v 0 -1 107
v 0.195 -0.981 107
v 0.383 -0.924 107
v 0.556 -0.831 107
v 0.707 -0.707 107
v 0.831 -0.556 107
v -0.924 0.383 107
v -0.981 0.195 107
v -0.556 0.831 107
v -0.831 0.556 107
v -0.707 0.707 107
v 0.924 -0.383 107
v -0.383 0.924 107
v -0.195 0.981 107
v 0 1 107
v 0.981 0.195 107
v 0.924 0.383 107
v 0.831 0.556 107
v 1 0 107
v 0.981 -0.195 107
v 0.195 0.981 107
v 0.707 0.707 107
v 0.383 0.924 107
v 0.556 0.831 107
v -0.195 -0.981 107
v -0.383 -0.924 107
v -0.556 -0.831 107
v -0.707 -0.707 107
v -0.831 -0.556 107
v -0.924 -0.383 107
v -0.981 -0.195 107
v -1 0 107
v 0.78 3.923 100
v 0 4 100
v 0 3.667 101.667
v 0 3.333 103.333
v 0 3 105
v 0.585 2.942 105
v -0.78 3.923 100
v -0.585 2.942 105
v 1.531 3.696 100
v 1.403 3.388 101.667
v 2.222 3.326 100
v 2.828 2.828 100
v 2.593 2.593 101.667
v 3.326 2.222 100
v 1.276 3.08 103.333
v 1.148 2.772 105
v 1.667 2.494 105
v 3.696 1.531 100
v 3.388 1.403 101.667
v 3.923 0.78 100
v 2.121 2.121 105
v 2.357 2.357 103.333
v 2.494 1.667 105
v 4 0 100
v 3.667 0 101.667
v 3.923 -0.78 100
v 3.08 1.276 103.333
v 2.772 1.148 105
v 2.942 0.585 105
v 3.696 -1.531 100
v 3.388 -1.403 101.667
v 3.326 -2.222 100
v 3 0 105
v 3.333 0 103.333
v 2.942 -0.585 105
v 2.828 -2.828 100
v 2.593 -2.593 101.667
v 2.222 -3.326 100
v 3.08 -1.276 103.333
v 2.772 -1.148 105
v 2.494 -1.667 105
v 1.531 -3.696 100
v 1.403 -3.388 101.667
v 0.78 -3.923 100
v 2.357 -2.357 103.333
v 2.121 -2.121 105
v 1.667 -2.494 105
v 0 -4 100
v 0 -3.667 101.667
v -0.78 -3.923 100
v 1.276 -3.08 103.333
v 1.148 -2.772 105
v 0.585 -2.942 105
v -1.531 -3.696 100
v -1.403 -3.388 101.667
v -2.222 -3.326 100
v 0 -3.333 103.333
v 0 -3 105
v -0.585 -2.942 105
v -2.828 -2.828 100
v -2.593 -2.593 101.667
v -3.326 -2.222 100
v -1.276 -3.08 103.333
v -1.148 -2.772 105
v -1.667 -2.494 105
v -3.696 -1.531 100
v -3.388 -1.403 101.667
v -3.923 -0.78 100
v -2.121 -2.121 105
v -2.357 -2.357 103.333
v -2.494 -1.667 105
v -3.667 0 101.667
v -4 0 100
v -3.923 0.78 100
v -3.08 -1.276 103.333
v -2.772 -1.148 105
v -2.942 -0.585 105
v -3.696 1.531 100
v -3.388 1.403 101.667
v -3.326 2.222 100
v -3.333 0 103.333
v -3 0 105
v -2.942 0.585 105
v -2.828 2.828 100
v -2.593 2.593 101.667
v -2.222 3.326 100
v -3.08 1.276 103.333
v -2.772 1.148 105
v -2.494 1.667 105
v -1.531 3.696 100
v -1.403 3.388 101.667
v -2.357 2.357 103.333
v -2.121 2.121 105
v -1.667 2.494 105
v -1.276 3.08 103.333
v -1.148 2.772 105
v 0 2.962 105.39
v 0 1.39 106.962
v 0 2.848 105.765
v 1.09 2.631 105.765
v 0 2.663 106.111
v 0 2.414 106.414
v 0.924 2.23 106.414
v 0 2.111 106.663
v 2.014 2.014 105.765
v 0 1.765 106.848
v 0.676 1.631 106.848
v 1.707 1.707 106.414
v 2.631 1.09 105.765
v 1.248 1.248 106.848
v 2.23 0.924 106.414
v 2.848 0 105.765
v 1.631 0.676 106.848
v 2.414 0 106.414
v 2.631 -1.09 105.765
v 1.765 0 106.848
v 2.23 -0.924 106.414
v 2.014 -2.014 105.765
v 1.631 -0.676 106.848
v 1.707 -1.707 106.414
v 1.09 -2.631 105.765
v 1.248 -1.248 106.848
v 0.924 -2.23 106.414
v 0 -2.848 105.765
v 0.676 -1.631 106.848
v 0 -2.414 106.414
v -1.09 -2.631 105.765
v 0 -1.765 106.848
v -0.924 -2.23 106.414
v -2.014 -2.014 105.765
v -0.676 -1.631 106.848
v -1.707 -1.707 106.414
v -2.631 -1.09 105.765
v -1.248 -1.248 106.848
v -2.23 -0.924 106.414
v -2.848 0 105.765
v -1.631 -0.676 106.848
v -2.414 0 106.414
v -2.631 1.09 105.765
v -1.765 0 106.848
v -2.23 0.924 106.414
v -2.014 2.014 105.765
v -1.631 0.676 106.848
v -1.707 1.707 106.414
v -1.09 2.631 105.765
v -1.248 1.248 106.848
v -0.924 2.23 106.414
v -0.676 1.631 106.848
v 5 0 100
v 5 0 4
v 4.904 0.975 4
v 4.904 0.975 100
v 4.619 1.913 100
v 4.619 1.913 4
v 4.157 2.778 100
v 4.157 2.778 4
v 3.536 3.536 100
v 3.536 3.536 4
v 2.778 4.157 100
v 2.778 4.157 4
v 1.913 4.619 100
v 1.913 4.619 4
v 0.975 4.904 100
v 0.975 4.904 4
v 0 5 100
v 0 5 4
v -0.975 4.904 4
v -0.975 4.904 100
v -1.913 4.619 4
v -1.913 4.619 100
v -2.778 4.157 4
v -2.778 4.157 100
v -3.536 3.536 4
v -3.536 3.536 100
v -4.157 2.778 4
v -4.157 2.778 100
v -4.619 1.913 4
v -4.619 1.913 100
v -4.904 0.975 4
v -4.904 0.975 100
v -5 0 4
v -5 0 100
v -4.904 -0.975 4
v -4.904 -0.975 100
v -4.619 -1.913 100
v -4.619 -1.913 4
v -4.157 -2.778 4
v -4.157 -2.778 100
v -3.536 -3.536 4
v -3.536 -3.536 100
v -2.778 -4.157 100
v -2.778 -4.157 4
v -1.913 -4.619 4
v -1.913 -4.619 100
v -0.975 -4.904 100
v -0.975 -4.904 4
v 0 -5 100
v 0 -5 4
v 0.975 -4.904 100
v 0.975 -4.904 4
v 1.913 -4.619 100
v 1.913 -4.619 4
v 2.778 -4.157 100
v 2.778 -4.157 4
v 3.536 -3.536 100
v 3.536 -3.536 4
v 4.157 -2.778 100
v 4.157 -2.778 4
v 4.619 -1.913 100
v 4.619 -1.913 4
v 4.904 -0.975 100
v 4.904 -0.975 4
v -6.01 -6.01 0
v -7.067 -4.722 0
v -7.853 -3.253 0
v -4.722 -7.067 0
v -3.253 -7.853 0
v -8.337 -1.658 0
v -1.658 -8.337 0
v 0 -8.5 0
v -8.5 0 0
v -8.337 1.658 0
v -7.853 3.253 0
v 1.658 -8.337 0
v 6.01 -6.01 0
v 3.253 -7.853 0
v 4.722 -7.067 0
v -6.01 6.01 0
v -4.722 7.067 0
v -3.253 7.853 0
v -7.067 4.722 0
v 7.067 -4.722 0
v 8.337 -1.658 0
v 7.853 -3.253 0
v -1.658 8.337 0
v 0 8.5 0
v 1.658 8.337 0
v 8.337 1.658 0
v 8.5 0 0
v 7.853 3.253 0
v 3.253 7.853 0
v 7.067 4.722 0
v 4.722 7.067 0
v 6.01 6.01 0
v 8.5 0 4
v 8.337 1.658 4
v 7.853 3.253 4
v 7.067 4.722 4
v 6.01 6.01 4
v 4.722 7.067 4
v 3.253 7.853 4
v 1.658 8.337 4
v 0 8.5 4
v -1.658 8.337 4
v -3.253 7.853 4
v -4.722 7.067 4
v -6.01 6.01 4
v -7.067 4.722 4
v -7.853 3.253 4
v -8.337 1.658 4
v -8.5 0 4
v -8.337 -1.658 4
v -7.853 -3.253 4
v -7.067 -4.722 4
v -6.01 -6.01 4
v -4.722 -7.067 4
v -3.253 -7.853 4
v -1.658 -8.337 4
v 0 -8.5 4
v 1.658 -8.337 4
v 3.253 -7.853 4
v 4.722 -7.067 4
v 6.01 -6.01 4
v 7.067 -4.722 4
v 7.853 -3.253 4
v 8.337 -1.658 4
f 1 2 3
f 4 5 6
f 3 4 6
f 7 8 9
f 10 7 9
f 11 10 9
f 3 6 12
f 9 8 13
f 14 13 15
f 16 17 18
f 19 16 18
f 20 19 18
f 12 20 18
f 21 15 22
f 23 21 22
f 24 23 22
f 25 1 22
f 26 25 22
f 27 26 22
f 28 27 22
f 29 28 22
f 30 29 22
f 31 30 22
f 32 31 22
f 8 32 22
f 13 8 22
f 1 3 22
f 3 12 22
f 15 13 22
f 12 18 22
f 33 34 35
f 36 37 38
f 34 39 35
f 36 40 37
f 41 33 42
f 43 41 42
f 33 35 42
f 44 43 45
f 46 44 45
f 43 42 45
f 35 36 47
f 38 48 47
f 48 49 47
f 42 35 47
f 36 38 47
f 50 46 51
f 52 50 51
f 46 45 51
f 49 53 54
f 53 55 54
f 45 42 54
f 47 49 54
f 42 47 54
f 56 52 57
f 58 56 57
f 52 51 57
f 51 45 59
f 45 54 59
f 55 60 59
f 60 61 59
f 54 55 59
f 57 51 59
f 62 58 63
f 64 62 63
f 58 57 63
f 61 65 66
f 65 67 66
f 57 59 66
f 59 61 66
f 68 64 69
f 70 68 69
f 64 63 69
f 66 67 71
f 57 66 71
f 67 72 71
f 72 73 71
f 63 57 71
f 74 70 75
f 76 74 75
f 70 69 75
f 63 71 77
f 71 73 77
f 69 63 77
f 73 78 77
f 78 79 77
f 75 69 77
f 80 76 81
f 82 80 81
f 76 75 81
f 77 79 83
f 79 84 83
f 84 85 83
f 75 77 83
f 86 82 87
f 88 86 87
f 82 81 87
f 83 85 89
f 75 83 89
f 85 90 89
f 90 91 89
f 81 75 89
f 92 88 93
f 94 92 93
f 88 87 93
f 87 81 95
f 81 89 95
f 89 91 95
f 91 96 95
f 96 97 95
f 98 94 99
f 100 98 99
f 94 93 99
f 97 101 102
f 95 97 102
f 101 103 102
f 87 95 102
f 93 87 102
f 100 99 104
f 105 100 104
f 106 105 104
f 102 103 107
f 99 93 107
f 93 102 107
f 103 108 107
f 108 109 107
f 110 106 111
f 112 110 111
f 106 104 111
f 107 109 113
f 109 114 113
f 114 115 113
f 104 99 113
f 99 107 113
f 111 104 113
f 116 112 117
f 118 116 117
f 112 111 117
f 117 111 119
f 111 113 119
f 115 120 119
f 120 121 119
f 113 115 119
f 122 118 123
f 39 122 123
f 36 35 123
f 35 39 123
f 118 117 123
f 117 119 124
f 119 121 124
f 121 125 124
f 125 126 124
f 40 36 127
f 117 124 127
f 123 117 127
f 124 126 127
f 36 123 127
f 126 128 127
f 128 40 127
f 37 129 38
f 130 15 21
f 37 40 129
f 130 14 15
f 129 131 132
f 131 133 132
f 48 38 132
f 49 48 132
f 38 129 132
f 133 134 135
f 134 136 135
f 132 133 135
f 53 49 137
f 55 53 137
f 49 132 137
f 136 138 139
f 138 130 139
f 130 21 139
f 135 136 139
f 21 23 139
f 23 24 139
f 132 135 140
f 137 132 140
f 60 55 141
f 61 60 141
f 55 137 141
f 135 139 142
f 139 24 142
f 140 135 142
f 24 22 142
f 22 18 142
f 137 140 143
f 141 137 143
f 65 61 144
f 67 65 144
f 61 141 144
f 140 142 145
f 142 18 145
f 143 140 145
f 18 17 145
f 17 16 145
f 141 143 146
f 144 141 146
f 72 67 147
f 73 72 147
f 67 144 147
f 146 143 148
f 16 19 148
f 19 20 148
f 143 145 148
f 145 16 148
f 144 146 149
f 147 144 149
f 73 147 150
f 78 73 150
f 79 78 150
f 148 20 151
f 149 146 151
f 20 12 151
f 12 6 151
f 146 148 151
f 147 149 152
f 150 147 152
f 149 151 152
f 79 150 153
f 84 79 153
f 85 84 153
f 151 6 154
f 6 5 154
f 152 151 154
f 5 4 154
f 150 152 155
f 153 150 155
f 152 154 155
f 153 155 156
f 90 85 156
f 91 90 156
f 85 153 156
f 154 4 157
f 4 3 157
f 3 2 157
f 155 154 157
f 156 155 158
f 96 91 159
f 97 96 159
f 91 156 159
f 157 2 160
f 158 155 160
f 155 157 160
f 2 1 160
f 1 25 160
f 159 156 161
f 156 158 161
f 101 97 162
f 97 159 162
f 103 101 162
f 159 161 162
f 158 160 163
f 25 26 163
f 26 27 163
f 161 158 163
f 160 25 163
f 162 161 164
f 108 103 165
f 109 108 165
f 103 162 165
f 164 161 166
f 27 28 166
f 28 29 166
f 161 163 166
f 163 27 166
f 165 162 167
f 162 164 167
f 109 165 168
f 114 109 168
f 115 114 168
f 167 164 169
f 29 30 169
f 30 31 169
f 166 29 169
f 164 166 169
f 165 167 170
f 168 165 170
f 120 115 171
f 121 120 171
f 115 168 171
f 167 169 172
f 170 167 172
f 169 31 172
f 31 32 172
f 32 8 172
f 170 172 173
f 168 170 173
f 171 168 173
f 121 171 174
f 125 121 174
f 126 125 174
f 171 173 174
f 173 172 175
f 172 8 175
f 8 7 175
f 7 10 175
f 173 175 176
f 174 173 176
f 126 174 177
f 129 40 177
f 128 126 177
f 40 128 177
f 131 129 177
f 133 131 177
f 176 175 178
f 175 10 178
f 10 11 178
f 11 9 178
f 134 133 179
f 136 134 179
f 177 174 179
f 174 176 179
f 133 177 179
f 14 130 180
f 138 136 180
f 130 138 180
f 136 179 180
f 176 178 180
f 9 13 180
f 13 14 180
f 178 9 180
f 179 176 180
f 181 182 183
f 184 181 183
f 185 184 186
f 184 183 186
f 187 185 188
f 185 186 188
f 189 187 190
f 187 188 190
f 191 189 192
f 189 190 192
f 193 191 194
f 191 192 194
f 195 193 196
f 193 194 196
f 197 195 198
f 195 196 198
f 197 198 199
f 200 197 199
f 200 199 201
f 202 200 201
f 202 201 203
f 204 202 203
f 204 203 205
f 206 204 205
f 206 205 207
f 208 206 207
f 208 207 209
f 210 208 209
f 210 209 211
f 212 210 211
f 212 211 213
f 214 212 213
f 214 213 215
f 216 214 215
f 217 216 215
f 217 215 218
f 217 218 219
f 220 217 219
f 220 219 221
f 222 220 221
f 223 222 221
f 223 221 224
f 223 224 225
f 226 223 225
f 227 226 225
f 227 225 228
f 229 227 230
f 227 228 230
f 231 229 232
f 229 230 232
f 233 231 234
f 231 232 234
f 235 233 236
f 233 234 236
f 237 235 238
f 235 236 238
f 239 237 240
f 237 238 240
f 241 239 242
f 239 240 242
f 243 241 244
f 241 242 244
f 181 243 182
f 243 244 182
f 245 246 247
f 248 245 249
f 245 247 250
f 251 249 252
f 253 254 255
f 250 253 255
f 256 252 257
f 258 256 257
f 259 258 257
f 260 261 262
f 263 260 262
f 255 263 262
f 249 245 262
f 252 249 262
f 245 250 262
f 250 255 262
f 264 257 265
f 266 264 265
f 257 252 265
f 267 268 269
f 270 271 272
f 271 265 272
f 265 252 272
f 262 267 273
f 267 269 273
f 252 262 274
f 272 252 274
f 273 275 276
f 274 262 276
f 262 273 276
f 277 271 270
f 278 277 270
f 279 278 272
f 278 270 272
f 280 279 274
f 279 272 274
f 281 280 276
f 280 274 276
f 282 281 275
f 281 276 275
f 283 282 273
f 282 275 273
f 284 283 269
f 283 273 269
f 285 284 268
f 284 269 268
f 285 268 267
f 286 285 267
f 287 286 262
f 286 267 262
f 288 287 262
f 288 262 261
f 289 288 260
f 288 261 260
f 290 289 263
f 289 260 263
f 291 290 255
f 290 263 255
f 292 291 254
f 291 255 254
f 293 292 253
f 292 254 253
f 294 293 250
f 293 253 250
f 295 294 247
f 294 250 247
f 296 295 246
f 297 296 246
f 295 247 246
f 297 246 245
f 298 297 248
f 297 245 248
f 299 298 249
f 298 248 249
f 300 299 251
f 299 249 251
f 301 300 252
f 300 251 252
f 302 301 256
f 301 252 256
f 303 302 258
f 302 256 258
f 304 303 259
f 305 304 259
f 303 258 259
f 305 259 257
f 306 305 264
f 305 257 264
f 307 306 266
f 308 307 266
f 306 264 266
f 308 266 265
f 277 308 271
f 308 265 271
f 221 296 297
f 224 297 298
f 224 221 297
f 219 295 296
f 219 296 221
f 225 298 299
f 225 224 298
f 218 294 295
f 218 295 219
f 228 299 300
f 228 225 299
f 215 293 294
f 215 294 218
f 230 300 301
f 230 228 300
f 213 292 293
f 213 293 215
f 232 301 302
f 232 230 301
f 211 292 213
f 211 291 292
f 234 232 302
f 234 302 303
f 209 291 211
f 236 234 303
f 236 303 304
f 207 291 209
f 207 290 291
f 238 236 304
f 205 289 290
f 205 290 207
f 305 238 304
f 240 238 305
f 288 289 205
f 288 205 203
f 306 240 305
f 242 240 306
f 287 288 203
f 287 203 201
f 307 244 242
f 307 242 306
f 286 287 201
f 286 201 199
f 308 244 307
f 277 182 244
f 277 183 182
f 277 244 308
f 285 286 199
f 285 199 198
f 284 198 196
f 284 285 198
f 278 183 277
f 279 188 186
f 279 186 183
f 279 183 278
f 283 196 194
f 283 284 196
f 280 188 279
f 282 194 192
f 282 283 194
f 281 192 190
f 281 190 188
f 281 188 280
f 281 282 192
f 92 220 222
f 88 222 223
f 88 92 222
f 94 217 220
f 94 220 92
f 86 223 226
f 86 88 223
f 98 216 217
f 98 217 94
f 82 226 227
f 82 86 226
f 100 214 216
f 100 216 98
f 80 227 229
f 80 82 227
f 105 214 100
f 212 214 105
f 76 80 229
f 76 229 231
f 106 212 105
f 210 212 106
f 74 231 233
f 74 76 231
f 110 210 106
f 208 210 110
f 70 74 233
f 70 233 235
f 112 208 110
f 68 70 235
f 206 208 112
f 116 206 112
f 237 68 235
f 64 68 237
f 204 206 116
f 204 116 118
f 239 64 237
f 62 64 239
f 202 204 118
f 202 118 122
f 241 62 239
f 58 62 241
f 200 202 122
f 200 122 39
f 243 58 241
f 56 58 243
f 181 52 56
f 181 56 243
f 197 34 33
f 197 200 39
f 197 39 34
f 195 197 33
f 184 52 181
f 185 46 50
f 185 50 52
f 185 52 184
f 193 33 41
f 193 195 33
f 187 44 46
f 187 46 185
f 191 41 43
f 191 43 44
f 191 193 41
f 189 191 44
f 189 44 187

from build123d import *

# Parameters (mm, degrees)
F0_R     = 8.5
F1_DEPTH = 4
F2_R     = 5
F3_DEPTH = 100


with BuildPart() as f1:
    # F0 (on Top) → F1 (new body)
    with BuildSketch(Plane.XY):
        Circle(F0_R)
    extrude(amount=F1_DEPTH)

    # F2 (on Top) → F3 (join)
    with BuildSketch(Plane.XY):
        Circle(F2_R)
    extrude(amount=F3_DEPTH)

    # F4 (on Right) → F5 (revolve)
    with BuildSketch(Plane.YZ):
        Polygon((3, 105), (0, 105), (0, 100), (4, 100), align=None)
    revolve(axis=Axis((0, 0, 102.5), (0, 0, -1)))

    # F6 (on Right) → F7 (revolve)
    with BuildSketch(Plane.YZ):
        with BuildLine():
            Line((1, 107), (0, 107))
            Line((0, 107), (0, 105))
            Line((0, 105), (3, 105))
            ThreePointArc((3, 105), (2.414214, 106.414214), (1, 107))
        make_face()
    revolve(axis=Axis((0, 0, 106), (0, 0, -1)))


solid = f1.part
